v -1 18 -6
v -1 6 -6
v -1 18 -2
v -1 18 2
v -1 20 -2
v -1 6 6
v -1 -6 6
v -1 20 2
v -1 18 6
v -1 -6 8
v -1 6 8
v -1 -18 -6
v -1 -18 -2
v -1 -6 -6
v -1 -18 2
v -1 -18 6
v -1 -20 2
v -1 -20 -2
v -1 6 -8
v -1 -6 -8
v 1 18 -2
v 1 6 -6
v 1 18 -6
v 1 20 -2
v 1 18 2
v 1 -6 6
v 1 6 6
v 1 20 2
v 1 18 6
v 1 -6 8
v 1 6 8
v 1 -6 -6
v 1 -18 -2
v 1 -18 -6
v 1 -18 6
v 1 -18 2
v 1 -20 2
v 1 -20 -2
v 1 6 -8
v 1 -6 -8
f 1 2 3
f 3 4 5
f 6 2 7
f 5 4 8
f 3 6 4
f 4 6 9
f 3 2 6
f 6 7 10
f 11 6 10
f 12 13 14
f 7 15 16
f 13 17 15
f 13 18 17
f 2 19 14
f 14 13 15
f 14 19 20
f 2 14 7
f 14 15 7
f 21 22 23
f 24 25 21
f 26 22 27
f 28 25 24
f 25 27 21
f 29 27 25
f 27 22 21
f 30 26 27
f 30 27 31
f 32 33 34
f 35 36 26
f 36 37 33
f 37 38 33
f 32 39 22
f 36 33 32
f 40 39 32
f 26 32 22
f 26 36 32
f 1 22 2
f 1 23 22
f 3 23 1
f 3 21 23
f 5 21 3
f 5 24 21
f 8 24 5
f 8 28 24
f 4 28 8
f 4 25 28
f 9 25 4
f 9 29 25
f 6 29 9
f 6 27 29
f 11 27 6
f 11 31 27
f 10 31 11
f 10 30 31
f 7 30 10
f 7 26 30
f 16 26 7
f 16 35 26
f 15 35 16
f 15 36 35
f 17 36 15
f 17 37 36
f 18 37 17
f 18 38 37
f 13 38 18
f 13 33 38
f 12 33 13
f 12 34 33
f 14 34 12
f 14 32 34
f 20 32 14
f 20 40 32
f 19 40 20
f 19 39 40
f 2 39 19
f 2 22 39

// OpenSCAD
// file: ../lib/side.scad
module side_top_bottom(inner_x,inner_y,width) {
  x = inner_x/2;
  y = inner_y/2;

  polygon(points=[
      [-x-width,-y-width],
      [-x*1/3,-y-width],
      [-x*1/3,-y],
      [x*1/3,-y],
      [x*1/3,-y-width],
      [x+width,-y-width],
      [x+width,-y*1/3],
      [x,-y*1/3],
      [x,y*1/3],
      [x+width,y*1/3],
      [x+width,y+width],
      [x*1/3,y+width],
      [x*1/3,y],
      [-x*1/3,y],
      [-x*1/3,y+width],
      [-x-width,y+width],
      [-x-width,y*1/3],
      [-x,y*1/3],
      [-x,-y*1/3],
      [-x-width,-y*1/3],
    ],convexity=10);
}

module side_left_right(inner_x,inner_z,width) {
  x = inner_x/2;
  z = inner_z/2;

  polygon(points=[
      [-x-width,-z],
      [-x*1/3,-z],
      [-x*1/3,-z-width],
      [x*1/3,-z-width],
      [x*1/3,-z],
      [x+width,-z],
      [x+width,-z*1/3],
      [x,-z*1/3],
      [x,z*1/3],
      [x+width,z*1/3],
      [x+width,z],
      [x*1/3,z],
      [x*1/3,z+width],
      [-x*1/3,z+width],
      [-x*1/3,z],
      [-x-width,z],
      [-x-width,z*1/3],
      [-x,z*1/3],
      [-x,-z*1/3],
      [-x-width,-z*1/3],
    ],convexity=10);
}


module side_front_back(inner_y,inner_z,width) {
  y = inner_y/2;
  z = inner_z/2;

  polygon(points=[
      [-y,-z],
      [-y*1/3,-z],
      [-y*1/3,-z-width],
      [y*1/3,-z-width],
      [y*1/3,-z],
      [y,-z],
      [y,-z*1/3],
      [y+width,-z*1/3],
      [y+width,z*1/3],
      [y,z*1/3],
      [y,z],
      [y*1/3,z],
      [y*1/3,z+width],
      [-y*1/3,z+width],
      [-y*1/3,z],
      [-y,z],
      [-y,z*1/3],
      [-y-width,z*1/3],
      [-y-width,-z*1/3],
      [-y,-z*1/3],
    ],convexity=10);
}
// file: front.2d.scad
use <../lib/side.scad>

module front() {
  side_front_back(36,12,2);
}

front();
// main file
use <front.2d.scad>;

rotate([90,0,90]) {
  linear_extrude(height = 2, center = true, convexity = 10, twist = 0) {
    front();
  }
}
